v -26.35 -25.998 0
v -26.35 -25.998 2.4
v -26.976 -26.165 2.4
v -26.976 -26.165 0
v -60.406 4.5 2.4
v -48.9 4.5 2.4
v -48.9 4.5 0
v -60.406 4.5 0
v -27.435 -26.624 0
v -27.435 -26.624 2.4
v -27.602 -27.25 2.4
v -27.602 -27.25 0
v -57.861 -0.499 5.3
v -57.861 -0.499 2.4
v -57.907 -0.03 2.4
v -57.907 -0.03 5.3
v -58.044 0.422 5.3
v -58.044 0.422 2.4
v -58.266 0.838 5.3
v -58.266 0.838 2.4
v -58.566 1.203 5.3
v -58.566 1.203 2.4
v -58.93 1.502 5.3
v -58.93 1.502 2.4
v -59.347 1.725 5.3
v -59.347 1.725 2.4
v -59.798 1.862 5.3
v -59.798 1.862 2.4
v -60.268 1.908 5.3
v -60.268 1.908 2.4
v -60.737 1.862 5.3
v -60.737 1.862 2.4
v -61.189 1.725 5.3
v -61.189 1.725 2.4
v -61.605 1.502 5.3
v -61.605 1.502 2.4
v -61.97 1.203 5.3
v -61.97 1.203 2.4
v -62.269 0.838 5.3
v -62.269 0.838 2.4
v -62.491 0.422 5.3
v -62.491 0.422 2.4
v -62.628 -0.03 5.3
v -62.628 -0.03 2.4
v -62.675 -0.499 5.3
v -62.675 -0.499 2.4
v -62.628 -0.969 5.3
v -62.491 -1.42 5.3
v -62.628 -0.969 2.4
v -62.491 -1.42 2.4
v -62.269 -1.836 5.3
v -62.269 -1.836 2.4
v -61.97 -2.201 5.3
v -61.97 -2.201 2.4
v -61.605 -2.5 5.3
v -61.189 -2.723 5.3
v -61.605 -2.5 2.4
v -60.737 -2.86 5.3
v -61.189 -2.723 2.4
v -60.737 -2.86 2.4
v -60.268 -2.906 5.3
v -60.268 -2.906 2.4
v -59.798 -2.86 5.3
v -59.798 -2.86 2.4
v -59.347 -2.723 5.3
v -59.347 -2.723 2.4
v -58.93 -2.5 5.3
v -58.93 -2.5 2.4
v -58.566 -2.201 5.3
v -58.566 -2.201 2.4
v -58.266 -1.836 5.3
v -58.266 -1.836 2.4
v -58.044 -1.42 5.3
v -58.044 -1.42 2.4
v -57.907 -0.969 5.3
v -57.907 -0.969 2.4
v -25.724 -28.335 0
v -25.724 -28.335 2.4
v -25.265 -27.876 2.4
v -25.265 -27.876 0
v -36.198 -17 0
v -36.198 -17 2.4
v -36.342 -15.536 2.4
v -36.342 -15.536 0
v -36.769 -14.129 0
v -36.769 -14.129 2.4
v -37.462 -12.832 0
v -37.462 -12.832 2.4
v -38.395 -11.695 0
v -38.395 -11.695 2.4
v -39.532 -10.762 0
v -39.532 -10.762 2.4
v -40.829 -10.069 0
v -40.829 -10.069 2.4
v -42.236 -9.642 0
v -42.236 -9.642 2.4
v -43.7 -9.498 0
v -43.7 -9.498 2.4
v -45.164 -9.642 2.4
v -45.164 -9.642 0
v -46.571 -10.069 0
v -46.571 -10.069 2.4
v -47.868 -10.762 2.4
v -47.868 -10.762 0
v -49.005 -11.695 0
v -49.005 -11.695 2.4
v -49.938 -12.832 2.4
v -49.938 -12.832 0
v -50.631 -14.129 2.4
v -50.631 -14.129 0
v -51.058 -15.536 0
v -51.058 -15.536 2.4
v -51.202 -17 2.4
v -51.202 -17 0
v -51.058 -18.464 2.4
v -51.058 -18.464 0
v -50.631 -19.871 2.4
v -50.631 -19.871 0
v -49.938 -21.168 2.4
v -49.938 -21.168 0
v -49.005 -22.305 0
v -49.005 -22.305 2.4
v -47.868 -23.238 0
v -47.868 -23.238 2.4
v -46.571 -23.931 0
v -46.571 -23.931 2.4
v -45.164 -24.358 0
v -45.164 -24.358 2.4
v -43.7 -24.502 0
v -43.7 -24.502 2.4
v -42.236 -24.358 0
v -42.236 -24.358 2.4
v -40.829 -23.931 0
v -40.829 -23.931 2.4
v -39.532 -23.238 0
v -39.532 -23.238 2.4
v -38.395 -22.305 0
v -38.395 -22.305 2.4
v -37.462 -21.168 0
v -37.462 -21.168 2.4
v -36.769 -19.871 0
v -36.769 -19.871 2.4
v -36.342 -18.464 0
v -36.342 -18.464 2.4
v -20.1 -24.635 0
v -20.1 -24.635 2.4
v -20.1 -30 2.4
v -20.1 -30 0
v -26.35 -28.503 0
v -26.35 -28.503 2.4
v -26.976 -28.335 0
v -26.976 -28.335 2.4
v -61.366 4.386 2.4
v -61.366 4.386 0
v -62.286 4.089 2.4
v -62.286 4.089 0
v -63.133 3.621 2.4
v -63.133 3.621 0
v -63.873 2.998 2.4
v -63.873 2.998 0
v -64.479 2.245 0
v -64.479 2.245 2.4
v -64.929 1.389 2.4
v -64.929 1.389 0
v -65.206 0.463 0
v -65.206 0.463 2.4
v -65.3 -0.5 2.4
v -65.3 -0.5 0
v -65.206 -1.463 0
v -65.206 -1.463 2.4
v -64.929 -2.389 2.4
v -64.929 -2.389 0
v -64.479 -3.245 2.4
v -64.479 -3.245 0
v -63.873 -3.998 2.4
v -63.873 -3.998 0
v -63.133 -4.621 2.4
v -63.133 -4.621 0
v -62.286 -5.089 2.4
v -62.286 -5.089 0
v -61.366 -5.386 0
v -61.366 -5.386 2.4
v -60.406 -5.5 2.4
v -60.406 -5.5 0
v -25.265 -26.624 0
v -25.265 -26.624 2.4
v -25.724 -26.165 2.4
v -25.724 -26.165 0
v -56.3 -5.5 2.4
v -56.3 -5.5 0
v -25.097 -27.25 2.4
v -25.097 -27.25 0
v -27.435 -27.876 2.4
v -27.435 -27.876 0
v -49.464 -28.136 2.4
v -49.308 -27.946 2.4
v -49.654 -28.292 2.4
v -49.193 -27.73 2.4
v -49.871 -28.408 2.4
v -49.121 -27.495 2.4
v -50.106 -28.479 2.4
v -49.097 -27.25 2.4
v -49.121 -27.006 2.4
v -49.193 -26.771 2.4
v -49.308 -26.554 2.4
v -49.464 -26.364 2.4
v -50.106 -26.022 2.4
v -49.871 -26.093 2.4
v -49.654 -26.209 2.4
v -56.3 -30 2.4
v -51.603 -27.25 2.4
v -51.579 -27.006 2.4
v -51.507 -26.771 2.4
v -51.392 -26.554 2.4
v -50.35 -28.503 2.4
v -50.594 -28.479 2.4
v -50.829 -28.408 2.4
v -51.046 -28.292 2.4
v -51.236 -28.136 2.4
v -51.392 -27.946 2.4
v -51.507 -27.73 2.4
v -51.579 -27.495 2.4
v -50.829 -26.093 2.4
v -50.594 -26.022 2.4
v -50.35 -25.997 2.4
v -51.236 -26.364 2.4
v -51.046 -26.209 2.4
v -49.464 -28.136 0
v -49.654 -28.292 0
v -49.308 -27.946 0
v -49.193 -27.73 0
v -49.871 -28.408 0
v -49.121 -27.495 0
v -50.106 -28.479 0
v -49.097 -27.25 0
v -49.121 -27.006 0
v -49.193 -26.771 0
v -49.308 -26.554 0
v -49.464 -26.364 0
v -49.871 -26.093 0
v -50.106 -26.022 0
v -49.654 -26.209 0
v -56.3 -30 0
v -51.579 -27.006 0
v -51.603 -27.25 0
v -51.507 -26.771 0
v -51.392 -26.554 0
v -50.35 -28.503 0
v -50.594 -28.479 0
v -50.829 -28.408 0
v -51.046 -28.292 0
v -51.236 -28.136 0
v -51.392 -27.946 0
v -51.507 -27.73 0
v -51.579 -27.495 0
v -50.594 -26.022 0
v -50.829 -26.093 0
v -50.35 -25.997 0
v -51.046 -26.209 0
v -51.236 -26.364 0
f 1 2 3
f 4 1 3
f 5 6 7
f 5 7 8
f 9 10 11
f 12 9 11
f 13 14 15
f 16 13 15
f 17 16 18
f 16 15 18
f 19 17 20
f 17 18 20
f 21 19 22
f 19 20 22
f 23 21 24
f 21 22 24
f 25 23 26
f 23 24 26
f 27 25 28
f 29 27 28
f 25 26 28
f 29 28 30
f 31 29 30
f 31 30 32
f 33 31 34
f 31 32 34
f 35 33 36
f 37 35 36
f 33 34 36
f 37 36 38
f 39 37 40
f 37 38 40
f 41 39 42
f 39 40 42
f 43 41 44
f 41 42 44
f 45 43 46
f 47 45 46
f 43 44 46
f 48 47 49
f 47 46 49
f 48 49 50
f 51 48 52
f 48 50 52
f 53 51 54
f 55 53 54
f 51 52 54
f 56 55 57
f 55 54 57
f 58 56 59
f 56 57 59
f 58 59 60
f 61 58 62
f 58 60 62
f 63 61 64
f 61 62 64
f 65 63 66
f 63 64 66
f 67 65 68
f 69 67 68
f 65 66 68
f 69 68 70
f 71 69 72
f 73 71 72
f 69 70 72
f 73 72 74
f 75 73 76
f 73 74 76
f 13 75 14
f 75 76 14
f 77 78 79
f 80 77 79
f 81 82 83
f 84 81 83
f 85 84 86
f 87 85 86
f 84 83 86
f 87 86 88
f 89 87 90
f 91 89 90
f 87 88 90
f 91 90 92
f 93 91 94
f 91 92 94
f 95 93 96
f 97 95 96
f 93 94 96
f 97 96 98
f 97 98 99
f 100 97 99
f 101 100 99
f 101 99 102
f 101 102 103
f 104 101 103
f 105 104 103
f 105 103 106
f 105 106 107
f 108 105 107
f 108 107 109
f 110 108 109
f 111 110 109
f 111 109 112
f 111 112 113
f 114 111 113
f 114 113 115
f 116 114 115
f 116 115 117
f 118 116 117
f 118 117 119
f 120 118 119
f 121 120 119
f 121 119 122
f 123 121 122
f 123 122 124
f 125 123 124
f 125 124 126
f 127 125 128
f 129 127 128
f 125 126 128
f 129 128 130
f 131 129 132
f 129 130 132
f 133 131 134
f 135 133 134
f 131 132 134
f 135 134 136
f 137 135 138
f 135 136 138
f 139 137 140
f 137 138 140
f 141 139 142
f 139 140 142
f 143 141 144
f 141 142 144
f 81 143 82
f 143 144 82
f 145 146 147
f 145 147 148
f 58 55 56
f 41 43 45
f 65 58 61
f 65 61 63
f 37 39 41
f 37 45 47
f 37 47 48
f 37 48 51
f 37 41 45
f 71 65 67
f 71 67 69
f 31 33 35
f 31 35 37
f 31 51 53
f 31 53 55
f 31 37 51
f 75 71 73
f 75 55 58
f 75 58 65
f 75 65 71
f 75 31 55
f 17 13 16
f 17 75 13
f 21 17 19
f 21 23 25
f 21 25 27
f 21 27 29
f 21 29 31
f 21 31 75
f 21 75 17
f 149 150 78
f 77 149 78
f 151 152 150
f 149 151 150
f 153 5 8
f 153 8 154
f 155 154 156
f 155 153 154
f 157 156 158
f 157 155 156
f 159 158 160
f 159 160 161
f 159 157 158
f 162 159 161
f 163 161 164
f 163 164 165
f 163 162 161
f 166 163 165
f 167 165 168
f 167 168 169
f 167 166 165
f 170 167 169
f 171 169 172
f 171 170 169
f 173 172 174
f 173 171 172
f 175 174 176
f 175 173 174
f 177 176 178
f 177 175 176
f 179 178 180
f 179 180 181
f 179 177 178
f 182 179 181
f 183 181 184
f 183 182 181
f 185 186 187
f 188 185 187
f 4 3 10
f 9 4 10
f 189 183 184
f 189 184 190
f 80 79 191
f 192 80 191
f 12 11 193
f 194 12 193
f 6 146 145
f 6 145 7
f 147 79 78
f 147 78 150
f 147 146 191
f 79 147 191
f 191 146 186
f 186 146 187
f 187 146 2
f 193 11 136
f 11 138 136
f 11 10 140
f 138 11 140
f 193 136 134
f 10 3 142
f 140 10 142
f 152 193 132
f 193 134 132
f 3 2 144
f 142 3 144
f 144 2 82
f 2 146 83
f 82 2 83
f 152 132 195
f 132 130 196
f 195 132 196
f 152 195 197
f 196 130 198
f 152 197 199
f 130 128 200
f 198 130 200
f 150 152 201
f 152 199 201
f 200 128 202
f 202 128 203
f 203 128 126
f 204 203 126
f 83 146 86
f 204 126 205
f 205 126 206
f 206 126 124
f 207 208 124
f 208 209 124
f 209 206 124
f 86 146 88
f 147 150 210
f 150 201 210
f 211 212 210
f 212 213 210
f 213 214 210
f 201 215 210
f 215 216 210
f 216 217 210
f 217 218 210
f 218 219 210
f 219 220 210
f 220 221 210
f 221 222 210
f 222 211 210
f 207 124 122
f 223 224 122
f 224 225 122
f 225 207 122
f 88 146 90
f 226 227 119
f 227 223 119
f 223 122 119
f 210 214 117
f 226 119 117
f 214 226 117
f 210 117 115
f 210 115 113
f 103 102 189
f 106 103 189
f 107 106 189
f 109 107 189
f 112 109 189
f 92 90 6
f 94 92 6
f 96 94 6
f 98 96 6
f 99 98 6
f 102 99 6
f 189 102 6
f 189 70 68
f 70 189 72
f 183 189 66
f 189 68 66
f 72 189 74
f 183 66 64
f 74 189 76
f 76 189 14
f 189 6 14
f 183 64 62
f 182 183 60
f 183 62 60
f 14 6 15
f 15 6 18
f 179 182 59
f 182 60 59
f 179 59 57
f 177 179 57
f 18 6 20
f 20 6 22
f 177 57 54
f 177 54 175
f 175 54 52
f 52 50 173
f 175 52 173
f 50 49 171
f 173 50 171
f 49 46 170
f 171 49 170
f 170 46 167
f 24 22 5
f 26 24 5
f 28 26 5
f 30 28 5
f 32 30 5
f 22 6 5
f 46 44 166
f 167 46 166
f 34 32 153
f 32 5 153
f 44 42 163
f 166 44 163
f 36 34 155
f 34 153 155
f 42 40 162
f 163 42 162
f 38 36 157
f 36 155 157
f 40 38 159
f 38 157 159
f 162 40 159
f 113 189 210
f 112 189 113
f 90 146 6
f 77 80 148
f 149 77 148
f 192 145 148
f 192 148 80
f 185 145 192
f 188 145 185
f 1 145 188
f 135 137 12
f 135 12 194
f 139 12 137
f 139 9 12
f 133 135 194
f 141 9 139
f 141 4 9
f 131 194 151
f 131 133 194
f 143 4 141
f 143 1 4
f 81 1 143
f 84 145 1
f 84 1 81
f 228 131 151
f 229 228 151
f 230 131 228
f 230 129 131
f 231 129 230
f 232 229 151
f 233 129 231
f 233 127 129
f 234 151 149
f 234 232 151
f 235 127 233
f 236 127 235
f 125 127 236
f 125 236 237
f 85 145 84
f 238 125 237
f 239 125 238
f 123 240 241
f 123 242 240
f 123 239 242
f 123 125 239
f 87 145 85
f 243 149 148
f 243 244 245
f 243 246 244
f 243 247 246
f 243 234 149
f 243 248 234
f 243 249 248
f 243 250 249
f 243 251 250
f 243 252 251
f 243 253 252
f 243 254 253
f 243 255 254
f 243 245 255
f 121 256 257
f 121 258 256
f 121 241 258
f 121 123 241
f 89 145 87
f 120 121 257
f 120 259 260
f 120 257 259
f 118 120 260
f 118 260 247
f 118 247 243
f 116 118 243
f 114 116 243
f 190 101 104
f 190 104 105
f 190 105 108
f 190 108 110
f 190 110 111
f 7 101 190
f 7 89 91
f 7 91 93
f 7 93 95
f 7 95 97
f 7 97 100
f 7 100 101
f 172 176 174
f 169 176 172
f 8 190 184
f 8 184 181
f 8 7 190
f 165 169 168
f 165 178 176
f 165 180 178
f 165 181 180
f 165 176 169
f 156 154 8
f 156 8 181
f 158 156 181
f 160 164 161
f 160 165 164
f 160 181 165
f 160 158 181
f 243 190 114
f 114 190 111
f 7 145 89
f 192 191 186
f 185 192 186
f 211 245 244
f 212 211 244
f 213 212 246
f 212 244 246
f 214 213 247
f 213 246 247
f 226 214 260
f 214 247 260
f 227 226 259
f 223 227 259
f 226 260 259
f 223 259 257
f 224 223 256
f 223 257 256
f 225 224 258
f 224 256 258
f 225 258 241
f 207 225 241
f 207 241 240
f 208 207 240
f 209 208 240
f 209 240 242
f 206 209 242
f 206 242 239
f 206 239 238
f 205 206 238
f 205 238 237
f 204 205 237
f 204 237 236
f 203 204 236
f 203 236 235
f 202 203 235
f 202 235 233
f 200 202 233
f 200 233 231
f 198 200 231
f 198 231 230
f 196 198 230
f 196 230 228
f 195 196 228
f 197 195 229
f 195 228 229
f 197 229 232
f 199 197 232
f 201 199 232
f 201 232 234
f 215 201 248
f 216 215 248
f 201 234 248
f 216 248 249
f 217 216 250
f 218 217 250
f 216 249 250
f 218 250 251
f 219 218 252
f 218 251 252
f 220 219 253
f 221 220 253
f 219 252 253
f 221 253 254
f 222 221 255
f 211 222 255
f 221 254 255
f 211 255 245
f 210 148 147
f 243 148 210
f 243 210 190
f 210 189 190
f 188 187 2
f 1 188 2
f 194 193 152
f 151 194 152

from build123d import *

# Parameters (mm, degrees)
BOSS_EXTRU_1_DEPTH      = 2.400000114
ESQUISSE9_W             = 36.19999811
ESQUISSE9_H             = 2.400000114
BOSS_EXTRU_2_DEPTH      = 5.365243182
ESQUISSE14_R            = 7.502289609
ENL_V_MAT_EXTRU_1_DEPTH = 72.901671136
ENL_V_MAT_EXTRU_2_DEPTH = 72.901671136
ESQUISSE25_R            = 1.252758793
ENL_V_MAT_EXTRU_3_DEPTH = 72.901671136
ESQUISSE28_R            = 2.406964412
BOSS_EXTRU_3_DEPTH      = 2.9


with BuildPart() as part:
    # Esquisse4 → Boss.-Extru.1 (new body)
    with BuildSketch(Plane.XY.offset(2.400000114)):
        with BuildLine():
            Line((-20.100001246, -24.634756148), (-48.900358379, 4.499999806))
            Line((-48.900358379, 4.499999806), (-60.405611992, 4.499999806))
            ThreePointArc((-60.405611992, 4.499999806), (-65.300002694, -0.500000082), (-60.405611992, -5.49999997))
            Line((-60.405611992, -5.49999997), (-56.299999356, -5.49999997))
            Line((-56.299999356, -5.49999997), (-56.299999356, -24.634756148))
            Line((-56.299999356, -24.634756148), (-20.100001246, -24.634756148))
        make_face()
    extrude(amount=-BOSS_EXTRU_1_DEPTH)

    # Esquisse9 → Boss.-Extru.2 (add)
    with BuildSketch(Plane(origin=(0, -24.634756148, 0), x_dir=(-1, 0, 0), z_dir=(0, -1, 0))):
        with Locations((38.200000301, -1.200000057)):
            Rectangle(ESQUISSE9_W, ESQUISSE9_H)
    extrude(amount=BOSS_EXTRU_2_DEPTH)

    # Esquisse14 → Enlèv. mat.-Extru.1 (cut, through all)
    with BuildSketch(Plane.XY.offset(2.400000114)):
        with Locations((-43.700002134, -16.999939794)):
            Circle(ESQUISSE14_R)
    extrude(amount=-ENL_V_MAT_EXTRU_1_DEPTH, mode=Mode.SUBTRACT)

    # Esquisse19 → Enlèv. mat.-Extru.2 (cut, through all)
    with BuildSketch(Plane.XY.offset(2.400000114)):
        Polygon((-26.350000873, -28.503000736), (-25.724001229, -28.334999457), (-25.264998898, -27.875998989), (-25.096999481, -27.249999344), (-25.264998898, -26.6239997), (-25.724001229, -26.165001094), (-26.350000873, -25.998000056), (-26.976000518, -26.165001094), (-27.434999123, -26.6239997), (-27.602000162, -27.249999344), (-27.434999123, -27.875998989), (-26.976000518, -28.334999457), align=None)
    extrude(amount=-ENL_V_MAT_EXTRU_2_DEPTH, mode=Mode.SUBTRACT)

    # Esquisse25 → Enlèv. mat.-Extru.3 (cut, through all)
    with BuildSketch(Plane(origin=(0, 0, 0), x_dir=(-1, 0, 0), z_dir=(0, 0, -1))):
        with Locations((50.350001082, -27.250241944)):
            Circle(ESQUISSE25_R)
    extrude(amount=-ENL_V_MAT_EXTRU_3_DEPTH, mode=Mode.SUBTRACT)

    # Esquisse28 → Boss.-Extru.3 (add)
    with BuildSketch(Plane.XY.offset(2.400000114)):
        with Locations((-60.267728087, -0.4991006)):
            Circle(ESQUISSE28_R)
    extrude(amount=BOSS_EXTRU_3_DEPTH)


solid = part.part
